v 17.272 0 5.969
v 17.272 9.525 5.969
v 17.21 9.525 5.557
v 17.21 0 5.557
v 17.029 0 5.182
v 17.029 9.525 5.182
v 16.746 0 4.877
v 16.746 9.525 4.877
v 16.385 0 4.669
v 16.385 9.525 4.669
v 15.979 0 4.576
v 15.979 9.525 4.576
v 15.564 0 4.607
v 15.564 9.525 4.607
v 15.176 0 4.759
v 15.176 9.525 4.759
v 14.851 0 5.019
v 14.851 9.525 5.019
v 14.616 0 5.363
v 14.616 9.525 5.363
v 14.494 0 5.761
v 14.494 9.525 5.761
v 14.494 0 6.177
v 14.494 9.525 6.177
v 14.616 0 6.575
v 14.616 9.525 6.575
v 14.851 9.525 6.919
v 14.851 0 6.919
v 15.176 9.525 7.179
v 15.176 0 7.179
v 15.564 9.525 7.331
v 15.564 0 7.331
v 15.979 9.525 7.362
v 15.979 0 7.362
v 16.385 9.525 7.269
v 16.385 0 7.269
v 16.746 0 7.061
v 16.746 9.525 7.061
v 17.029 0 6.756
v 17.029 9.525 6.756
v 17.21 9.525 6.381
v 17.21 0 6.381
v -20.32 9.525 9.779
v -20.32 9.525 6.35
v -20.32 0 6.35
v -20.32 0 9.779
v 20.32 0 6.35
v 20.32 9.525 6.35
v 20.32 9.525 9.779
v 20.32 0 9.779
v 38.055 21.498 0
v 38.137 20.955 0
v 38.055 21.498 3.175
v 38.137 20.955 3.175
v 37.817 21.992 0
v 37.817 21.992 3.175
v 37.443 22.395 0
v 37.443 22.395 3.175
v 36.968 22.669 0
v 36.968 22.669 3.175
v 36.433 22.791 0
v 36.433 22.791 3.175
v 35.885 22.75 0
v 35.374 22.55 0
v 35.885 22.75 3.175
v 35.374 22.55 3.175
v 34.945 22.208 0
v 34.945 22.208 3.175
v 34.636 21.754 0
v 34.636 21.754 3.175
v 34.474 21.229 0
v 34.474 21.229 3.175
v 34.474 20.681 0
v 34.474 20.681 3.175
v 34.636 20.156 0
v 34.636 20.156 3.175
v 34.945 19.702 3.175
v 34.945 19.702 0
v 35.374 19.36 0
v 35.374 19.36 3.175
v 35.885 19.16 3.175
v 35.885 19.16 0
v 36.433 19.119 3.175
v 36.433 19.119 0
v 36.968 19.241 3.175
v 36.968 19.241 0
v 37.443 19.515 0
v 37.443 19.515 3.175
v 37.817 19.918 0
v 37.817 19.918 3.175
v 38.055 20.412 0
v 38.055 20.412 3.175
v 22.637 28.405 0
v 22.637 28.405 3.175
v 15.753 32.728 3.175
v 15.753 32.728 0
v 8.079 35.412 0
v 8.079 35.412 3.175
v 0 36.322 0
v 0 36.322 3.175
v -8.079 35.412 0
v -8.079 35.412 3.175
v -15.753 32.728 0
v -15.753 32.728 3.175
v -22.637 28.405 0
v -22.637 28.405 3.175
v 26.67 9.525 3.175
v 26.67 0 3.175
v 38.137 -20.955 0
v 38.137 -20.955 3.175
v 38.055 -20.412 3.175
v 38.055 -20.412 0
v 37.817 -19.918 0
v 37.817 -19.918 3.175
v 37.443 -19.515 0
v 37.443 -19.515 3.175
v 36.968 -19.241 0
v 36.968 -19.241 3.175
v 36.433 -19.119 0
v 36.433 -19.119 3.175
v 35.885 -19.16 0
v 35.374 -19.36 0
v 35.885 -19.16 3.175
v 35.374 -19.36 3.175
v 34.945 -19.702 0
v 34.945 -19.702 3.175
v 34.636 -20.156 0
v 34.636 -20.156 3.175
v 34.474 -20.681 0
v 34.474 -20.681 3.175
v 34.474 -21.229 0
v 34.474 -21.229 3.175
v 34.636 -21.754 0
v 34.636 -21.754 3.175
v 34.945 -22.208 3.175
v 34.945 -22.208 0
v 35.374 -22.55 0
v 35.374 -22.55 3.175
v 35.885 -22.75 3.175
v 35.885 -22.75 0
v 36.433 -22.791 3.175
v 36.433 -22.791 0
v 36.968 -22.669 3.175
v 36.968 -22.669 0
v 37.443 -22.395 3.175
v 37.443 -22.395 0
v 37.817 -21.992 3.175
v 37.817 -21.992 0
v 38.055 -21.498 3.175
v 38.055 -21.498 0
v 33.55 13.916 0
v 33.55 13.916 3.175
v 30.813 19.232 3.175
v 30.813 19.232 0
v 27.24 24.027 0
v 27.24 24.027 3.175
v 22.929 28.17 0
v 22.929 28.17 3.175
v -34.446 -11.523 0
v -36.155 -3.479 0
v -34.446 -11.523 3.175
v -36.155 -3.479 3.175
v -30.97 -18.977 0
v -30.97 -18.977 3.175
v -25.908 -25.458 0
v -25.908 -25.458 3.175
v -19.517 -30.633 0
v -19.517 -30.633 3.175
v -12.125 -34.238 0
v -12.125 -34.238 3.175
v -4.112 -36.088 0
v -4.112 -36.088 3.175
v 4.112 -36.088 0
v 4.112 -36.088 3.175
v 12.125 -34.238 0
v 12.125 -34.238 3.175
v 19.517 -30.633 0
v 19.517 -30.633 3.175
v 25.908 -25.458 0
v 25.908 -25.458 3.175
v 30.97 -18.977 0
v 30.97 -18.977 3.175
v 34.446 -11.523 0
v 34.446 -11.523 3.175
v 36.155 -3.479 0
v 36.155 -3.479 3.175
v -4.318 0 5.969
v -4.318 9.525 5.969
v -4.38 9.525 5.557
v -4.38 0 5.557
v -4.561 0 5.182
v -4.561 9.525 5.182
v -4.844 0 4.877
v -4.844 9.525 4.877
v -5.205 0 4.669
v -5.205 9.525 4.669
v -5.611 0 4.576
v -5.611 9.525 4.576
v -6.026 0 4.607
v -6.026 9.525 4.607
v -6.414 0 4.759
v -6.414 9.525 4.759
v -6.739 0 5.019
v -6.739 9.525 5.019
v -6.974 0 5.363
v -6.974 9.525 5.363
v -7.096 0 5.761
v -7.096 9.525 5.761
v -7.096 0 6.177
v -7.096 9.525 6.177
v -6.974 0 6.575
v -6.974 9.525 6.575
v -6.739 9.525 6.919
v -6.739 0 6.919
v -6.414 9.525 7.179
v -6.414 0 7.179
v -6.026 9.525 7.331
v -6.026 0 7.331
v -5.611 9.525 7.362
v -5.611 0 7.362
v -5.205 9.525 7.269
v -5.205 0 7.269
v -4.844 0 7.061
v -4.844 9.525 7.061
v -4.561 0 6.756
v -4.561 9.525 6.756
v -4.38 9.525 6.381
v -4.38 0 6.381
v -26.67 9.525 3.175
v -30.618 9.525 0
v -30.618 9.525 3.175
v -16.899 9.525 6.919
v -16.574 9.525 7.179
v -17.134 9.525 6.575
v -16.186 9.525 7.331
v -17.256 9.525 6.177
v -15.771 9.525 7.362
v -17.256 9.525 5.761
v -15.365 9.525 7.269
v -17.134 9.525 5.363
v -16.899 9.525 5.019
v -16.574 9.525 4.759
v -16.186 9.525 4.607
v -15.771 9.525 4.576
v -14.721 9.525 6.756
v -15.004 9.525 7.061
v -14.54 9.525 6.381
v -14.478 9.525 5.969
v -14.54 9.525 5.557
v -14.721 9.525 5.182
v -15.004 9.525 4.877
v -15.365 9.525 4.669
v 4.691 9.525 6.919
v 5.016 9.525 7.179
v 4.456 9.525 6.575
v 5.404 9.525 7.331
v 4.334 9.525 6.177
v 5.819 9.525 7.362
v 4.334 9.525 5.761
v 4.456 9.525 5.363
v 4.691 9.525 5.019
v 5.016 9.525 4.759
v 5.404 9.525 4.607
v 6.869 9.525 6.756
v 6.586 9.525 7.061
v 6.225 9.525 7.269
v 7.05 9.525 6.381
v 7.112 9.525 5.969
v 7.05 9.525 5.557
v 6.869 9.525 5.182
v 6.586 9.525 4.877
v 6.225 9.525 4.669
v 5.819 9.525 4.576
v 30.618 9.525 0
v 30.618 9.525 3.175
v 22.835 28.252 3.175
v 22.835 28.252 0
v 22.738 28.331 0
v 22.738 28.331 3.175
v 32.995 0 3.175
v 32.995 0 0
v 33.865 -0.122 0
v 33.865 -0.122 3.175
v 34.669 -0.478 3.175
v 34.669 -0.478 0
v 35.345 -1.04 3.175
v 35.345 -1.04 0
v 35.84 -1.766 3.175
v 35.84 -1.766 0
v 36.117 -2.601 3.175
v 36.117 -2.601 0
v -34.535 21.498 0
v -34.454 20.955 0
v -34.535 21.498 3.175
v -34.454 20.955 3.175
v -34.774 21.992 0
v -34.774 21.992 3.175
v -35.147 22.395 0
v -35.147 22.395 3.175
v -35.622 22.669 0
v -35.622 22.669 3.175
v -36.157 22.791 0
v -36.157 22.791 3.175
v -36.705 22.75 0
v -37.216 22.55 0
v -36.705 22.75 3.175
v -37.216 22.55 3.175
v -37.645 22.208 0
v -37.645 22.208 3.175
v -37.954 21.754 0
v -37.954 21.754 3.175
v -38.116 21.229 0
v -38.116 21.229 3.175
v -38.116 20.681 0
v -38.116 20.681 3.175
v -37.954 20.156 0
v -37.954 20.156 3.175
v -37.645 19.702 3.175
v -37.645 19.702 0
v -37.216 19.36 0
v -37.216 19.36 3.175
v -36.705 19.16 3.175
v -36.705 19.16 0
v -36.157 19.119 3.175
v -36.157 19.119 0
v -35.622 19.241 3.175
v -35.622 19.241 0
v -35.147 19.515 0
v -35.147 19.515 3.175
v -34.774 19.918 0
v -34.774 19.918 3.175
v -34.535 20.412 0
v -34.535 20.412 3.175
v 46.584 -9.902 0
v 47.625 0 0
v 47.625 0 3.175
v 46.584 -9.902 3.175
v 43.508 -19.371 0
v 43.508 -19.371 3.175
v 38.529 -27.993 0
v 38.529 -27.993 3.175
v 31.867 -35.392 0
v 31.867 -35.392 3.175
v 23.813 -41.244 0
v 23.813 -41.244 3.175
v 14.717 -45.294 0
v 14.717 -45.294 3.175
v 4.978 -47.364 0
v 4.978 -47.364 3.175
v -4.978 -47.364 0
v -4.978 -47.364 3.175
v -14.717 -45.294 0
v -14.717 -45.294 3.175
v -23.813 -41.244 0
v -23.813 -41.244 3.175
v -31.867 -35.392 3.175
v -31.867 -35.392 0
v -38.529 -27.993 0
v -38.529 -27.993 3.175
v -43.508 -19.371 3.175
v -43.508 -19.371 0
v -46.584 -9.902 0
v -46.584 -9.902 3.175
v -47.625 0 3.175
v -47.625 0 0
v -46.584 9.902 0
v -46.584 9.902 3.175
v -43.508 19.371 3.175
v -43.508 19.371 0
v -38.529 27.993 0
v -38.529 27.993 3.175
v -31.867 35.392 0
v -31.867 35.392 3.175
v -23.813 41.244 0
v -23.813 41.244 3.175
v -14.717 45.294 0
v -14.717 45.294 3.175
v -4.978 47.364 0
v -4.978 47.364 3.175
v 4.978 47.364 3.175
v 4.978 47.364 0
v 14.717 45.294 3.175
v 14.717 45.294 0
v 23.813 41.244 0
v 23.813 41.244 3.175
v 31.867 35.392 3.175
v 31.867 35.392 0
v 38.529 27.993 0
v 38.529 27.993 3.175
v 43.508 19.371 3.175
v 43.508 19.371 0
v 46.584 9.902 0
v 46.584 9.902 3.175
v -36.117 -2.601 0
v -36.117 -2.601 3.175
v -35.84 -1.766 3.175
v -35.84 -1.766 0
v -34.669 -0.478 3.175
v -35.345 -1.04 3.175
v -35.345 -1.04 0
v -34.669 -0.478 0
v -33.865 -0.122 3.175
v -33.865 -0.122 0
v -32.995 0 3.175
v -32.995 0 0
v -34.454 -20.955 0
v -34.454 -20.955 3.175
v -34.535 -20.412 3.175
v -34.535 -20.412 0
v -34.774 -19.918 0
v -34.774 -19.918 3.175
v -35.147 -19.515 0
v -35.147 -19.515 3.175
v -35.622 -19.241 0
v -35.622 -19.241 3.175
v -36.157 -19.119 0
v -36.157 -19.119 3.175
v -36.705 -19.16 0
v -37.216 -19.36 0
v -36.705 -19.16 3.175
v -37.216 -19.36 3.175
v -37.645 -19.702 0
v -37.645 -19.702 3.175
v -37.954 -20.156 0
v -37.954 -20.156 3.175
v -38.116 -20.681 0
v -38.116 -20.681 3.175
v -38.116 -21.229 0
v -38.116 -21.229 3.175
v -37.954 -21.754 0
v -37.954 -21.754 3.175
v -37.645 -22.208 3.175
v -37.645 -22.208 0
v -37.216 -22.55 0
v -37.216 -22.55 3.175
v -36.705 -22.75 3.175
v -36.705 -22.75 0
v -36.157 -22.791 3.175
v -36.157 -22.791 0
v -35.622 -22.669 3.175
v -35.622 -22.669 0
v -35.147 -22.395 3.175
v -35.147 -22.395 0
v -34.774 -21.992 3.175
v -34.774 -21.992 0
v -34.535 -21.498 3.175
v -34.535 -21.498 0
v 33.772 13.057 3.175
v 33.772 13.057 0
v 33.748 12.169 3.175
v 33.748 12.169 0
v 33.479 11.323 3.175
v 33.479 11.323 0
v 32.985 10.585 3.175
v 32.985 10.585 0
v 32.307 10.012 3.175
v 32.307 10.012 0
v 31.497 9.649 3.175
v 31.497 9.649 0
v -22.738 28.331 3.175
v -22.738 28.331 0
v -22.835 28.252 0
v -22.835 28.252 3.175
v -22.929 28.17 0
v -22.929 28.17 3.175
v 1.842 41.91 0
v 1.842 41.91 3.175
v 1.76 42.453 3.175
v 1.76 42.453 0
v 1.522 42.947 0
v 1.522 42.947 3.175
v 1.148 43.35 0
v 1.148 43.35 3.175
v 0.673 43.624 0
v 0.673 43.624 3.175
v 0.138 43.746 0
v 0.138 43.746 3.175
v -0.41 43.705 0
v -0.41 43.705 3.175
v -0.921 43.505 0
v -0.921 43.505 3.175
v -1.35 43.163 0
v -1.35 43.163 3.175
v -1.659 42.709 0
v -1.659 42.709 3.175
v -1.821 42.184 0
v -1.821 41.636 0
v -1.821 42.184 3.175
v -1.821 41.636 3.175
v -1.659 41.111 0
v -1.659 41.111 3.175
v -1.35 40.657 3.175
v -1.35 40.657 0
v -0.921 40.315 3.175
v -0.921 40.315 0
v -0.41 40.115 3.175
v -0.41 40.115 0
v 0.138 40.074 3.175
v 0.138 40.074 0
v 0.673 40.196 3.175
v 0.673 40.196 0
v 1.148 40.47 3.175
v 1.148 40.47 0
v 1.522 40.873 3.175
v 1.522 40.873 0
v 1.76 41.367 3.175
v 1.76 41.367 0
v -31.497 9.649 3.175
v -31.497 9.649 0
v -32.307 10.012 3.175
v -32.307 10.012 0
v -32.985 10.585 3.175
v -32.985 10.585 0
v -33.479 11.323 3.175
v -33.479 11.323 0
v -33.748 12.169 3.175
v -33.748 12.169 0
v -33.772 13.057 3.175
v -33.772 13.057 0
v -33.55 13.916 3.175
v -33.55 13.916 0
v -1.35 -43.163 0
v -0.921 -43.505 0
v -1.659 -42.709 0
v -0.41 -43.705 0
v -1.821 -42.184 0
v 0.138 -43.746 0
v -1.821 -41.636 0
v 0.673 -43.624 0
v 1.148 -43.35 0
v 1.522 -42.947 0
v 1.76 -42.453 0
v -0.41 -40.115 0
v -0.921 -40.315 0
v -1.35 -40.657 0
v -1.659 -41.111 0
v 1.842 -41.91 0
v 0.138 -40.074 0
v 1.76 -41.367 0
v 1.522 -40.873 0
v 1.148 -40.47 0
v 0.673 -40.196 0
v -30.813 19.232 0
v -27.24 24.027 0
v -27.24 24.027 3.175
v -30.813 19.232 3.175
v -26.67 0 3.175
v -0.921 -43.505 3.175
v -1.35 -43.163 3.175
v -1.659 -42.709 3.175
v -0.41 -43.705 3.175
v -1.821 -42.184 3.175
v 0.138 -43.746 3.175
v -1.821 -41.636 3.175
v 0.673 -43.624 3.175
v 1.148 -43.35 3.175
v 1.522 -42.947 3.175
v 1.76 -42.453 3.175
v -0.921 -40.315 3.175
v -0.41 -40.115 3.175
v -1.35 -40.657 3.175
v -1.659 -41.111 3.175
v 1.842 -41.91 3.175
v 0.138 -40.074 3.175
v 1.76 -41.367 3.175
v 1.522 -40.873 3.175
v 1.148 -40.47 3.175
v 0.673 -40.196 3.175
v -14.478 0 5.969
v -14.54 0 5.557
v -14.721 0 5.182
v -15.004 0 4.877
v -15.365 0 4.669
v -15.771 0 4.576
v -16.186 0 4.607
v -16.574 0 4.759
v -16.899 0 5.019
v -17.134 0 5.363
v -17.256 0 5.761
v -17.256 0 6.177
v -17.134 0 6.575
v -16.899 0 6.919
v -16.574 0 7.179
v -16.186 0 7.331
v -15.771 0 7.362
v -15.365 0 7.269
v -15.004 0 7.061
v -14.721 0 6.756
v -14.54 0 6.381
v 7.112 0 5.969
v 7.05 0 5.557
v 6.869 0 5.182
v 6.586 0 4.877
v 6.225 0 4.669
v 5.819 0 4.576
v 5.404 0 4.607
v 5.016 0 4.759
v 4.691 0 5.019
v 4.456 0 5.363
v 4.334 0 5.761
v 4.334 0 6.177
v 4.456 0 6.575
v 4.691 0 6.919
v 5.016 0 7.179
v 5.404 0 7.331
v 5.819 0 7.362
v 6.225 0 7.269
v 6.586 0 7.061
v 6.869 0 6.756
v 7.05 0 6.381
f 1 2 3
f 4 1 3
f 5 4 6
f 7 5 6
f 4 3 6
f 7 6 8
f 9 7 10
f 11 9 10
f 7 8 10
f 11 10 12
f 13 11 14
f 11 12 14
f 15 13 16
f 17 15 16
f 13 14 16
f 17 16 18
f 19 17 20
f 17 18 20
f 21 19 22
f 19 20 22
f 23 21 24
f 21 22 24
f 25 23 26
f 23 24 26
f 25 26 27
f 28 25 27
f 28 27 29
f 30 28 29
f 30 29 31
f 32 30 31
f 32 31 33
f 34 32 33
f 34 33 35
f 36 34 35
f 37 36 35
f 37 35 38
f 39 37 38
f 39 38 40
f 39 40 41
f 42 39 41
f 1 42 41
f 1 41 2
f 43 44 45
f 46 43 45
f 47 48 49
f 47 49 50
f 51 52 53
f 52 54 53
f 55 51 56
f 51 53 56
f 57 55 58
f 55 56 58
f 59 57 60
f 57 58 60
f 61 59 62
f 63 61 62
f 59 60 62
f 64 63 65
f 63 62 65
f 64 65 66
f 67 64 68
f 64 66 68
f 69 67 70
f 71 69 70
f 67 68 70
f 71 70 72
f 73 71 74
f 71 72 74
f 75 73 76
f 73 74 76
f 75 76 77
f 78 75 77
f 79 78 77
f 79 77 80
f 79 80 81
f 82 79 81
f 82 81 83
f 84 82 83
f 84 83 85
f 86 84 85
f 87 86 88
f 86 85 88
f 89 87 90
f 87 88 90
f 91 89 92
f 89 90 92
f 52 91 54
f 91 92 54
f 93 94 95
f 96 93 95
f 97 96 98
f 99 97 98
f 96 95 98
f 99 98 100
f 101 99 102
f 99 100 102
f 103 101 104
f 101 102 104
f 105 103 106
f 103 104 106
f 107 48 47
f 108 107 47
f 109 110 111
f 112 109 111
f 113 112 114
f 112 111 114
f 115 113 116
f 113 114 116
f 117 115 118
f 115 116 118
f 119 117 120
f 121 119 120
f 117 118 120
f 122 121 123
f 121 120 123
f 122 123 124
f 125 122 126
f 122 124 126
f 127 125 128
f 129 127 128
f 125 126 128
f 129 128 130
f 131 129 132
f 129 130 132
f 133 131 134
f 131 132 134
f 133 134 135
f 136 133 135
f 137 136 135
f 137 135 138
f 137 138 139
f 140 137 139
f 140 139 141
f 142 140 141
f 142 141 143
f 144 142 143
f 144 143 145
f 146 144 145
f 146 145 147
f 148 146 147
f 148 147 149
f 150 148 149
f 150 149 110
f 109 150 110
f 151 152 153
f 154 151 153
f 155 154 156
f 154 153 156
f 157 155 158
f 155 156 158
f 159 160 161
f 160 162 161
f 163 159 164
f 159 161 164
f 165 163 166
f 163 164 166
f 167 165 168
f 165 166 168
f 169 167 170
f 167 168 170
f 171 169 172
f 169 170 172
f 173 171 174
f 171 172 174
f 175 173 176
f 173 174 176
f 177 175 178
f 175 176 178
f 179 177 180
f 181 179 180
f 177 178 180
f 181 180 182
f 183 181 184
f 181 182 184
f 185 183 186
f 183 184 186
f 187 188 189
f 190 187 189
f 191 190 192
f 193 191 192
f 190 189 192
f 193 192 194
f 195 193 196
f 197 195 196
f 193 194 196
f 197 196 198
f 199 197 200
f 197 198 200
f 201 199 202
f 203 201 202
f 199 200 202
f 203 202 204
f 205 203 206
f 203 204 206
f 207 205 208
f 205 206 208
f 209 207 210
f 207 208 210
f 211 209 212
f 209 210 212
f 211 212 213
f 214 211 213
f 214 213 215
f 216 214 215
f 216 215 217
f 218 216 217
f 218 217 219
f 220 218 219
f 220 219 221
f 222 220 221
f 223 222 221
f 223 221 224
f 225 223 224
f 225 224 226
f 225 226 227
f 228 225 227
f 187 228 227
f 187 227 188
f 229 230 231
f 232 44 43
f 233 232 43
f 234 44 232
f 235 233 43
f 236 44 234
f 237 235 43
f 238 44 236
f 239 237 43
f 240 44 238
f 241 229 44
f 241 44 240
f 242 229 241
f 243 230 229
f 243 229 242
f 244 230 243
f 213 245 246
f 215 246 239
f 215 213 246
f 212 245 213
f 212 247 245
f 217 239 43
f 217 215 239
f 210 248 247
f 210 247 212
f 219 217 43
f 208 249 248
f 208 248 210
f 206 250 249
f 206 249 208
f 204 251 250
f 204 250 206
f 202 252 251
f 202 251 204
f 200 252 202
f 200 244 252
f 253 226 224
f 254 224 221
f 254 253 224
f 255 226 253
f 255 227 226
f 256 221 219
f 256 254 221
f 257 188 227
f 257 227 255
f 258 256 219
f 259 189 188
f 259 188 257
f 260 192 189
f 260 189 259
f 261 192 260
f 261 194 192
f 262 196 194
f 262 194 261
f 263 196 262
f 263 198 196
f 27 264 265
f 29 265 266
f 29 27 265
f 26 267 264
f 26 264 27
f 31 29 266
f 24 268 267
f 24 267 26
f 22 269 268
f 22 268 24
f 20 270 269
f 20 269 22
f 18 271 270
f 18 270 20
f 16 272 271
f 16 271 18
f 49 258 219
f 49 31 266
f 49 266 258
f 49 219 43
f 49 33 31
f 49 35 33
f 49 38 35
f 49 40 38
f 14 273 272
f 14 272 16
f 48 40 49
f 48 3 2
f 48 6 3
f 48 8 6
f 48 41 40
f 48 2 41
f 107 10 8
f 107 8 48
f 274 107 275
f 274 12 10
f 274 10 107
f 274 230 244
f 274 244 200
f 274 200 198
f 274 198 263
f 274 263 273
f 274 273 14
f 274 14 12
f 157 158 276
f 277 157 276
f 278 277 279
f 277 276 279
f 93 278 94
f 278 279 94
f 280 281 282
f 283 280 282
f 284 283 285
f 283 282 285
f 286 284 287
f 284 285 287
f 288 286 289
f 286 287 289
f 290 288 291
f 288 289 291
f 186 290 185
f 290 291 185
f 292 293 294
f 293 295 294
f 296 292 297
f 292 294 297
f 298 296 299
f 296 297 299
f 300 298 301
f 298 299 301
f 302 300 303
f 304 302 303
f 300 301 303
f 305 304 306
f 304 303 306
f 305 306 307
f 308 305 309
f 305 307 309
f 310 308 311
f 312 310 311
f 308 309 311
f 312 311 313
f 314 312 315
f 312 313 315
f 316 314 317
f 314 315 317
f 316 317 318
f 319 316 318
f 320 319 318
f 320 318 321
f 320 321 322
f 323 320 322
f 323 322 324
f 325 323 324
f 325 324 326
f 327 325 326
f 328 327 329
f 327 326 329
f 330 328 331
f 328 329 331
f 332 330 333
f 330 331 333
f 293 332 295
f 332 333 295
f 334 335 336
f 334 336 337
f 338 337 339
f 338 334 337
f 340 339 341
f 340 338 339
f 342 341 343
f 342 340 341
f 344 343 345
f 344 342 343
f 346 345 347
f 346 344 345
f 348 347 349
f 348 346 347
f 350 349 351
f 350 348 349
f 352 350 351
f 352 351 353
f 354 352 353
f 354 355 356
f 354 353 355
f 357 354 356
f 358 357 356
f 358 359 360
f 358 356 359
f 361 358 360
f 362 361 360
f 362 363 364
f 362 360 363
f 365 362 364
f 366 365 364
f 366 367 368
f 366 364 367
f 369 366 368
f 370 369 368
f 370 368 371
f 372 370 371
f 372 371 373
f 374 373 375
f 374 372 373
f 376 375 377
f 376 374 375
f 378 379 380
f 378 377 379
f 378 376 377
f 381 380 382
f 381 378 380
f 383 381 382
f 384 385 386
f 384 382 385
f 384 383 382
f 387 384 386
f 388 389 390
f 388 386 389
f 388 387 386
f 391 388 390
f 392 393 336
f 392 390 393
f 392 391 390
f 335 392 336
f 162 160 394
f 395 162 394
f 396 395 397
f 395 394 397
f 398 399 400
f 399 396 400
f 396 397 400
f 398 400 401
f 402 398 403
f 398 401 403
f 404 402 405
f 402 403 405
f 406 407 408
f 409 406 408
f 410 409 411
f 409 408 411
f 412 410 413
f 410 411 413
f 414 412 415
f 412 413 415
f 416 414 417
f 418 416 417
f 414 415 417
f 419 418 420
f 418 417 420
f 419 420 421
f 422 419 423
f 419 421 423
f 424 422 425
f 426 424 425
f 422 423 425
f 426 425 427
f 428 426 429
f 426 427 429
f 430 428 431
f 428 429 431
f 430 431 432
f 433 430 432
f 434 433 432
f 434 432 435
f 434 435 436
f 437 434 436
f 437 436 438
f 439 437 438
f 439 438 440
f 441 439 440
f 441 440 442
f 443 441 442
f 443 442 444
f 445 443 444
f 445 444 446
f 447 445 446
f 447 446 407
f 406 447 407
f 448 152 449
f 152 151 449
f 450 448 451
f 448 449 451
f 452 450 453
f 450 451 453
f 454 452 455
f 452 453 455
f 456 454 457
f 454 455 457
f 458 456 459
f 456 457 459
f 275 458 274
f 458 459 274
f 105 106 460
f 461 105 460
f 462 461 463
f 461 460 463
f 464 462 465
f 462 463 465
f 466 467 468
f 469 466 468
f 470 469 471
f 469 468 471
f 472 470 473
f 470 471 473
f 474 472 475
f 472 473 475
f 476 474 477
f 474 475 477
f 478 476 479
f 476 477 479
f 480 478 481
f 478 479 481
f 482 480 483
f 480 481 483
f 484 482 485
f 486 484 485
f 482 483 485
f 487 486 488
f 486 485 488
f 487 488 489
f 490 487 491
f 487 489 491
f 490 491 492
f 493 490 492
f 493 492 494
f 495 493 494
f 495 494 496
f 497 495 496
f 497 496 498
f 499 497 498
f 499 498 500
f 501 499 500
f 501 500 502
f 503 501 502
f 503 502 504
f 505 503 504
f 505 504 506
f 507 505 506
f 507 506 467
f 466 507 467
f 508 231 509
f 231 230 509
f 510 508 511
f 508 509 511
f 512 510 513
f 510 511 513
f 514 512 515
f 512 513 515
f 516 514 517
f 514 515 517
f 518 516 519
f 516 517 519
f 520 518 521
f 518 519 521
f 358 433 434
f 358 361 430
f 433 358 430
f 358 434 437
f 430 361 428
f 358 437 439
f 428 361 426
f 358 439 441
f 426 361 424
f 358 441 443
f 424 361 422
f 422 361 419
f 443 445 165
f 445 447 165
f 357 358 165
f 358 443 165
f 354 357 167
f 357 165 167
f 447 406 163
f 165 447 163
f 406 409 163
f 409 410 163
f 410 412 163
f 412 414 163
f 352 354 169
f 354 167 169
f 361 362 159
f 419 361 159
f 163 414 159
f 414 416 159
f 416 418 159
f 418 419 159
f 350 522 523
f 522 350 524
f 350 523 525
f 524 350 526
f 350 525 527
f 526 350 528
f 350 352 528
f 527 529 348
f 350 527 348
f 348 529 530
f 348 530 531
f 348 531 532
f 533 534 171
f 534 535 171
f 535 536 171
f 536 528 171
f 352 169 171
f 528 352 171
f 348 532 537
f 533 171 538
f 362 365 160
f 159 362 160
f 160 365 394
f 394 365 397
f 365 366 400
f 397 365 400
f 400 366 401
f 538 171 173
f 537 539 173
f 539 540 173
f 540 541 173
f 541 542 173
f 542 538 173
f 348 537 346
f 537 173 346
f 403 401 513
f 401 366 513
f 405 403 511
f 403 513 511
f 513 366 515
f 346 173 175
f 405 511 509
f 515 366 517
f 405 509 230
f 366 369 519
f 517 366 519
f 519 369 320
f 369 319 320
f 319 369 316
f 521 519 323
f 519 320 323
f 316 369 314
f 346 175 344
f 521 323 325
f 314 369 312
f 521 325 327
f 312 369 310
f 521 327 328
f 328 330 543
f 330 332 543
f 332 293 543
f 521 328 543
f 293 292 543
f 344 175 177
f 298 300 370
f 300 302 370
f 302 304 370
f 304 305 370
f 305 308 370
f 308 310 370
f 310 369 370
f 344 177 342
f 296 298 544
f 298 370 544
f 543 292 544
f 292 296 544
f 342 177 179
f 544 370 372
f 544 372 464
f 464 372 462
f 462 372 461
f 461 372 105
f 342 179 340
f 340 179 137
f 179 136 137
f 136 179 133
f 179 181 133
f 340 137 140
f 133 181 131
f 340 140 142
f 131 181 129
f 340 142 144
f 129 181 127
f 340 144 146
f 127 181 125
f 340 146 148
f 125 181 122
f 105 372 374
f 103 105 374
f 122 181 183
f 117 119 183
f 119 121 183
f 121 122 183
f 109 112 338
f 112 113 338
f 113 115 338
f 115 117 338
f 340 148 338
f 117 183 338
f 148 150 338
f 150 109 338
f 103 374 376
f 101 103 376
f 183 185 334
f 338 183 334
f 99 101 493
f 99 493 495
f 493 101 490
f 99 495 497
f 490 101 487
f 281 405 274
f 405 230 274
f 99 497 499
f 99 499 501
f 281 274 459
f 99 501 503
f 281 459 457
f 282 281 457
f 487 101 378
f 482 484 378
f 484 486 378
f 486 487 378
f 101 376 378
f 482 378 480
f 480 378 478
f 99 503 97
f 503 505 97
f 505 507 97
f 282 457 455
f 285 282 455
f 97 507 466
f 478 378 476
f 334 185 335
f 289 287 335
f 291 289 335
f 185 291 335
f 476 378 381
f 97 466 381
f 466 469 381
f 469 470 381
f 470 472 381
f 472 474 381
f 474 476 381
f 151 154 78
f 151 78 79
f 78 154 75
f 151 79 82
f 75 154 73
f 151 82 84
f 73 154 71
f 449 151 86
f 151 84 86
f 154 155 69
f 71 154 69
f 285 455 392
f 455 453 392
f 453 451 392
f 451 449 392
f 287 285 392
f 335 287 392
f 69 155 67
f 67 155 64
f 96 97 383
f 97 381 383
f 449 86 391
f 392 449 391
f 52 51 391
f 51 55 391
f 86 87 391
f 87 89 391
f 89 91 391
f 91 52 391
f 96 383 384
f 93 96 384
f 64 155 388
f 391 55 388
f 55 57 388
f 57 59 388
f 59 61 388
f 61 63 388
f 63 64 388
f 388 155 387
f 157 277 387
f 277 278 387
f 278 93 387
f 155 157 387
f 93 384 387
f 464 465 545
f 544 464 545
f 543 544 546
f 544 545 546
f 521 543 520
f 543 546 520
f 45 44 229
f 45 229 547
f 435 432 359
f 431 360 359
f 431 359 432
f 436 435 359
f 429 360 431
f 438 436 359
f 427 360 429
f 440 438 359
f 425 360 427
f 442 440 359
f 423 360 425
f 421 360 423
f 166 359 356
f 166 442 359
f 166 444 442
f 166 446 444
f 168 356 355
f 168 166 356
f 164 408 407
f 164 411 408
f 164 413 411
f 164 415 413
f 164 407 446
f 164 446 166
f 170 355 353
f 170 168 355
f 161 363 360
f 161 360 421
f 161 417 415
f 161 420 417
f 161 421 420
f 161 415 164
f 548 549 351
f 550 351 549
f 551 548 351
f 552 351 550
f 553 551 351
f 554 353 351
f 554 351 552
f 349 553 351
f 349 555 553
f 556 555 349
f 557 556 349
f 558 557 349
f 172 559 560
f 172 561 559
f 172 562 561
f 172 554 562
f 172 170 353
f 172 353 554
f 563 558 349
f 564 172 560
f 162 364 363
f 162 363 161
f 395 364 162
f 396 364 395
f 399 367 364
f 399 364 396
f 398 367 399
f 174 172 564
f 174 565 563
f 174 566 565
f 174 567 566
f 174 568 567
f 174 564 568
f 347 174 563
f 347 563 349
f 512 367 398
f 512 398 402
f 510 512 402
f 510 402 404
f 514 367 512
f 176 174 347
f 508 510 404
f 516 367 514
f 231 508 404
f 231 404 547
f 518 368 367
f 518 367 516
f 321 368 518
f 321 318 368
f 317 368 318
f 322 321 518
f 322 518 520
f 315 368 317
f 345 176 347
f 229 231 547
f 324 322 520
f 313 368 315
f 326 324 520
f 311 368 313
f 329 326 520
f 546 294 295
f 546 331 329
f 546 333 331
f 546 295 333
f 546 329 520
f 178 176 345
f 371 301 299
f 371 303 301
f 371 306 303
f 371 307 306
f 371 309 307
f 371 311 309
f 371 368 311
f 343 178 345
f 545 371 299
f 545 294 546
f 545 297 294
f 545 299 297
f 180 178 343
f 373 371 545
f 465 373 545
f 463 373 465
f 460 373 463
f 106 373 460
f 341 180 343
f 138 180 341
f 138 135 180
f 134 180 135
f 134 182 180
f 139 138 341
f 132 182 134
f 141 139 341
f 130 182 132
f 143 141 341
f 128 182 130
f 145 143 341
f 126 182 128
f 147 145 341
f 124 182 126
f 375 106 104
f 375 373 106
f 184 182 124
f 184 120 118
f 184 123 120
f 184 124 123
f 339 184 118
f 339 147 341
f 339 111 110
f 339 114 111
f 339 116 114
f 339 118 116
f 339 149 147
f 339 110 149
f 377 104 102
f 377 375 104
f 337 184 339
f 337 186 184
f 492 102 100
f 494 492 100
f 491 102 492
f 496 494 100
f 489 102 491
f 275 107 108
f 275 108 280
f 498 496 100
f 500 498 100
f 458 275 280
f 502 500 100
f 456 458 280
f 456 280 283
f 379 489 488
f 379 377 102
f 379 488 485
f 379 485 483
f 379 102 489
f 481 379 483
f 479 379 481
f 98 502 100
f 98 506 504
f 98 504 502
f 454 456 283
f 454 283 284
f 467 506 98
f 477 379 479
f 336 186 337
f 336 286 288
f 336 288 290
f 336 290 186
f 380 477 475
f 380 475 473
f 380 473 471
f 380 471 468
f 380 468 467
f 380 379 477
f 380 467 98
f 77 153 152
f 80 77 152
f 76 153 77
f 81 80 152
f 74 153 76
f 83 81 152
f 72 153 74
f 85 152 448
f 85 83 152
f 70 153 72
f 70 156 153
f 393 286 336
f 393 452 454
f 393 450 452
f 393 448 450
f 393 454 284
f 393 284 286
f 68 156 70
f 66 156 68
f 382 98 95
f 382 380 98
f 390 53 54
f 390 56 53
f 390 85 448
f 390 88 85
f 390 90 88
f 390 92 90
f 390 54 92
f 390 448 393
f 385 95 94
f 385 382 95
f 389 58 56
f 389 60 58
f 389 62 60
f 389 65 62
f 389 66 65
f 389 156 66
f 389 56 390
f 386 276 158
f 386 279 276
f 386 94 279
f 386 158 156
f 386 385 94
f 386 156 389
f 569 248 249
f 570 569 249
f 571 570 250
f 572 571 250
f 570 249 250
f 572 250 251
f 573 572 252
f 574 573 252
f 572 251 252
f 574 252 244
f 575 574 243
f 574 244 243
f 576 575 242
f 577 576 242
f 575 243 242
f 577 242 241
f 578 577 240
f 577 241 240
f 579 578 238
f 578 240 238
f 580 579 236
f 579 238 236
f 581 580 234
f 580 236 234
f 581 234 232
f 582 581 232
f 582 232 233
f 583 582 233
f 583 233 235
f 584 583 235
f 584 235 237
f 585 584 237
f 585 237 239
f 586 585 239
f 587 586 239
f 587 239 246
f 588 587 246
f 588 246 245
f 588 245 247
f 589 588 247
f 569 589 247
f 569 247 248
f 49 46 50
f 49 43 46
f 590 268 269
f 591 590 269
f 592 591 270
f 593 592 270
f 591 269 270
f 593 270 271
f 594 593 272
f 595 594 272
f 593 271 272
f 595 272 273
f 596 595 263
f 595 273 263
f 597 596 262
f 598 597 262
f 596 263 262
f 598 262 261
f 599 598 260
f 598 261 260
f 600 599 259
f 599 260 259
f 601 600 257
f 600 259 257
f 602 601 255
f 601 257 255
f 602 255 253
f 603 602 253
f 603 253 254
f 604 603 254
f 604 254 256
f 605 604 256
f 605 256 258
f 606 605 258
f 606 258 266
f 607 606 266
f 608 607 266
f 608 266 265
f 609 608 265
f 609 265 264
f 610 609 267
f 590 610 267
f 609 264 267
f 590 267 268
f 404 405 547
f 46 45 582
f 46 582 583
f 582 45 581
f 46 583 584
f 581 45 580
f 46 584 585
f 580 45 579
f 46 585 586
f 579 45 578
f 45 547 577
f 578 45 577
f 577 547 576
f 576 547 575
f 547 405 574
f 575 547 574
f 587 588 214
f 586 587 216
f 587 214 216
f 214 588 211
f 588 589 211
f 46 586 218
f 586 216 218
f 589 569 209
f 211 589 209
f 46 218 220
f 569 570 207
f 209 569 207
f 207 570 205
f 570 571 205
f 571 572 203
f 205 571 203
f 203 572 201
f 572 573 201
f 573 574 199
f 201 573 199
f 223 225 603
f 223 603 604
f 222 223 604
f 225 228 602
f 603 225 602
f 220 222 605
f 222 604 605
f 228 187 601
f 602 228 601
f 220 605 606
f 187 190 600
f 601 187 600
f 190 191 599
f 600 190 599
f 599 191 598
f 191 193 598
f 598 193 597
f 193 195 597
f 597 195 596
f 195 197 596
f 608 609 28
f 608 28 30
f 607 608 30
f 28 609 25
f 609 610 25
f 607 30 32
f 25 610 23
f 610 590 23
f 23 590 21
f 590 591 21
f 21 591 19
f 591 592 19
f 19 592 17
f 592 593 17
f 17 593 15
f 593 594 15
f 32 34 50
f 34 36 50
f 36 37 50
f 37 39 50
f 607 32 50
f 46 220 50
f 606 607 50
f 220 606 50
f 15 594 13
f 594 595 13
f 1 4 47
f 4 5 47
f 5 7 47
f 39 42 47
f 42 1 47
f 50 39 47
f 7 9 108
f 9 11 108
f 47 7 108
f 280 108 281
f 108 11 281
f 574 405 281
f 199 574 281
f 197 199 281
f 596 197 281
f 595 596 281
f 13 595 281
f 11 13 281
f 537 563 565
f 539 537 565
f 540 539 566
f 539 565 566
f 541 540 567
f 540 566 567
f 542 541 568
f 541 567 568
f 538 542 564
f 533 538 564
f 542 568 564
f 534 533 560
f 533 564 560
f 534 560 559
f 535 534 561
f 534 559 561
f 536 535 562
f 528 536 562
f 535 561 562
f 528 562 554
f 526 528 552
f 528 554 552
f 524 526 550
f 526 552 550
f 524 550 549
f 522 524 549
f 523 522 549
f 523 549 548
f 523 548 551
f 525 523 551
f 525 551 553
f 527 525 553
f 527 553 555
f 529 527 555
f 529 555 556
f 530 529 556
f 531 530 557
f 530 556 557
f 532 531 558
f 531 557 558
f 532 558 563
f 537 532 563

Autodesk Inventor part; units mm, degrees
ref_plane "YZ Plane" through (0, 0, 0) normal (1, 0, 0) x (0, 1, 0)
ref_plane "XZ Plane" through (0, 0, 0) normal (0, 1, 0) x (-1, 0, 0)
ref_plane "XY Plane" through (0, 0, 0) normal (0, 0, 1) x (1, 0, 0)
sketch "Sketch1" plane through (0, 0, 0) normal (0, 0, 1) x (1, 0, 0)
  circle A0 centre (0, 0) radius 47.625
  dimension "d0" = 95.25
extrude "Extrusion1" add sketch "Sketch1" along normal blind 3.175
sketch "Sketch3" plane through (0, 0, 3.175) normal (0, 0, 1) x (1, 0, 0)
  line L0 (1.27, 9.525) -> (20.32, 9.525)
  line L1 (20.32, 9.525) -> (20.32, 0)
  line L2 (20.32, 0) -> (1.27, 0)
  line L3 (1.27, 0) -> (1.27, 9.525)
  line L4 (0, 0) -> (0, -11.0035)
  line L5 (-1.27, 9.525) -> (-20.32, 9.525)
  line L6 (-20.32, 9.525) -> (-20.32, 0)
  line L7 (-20.32, 0) -> (-1.27, 0)
  line L8 (-1.27, 0) -> (-1.27, 9.525)
  dimension "d11" = 19.05
  dimension "d12" = 9.525
  dimension "d13" = 1.27
  dimension "d14" = 0
extrude "Extrusion3" add sketch "Sketch3" along normal blind 6.604
sketch "Sketch4" plane through (1.27, 9.525, 3.175) normal (0, 1, 0) x (1, 0, 0)
  circle A0 centre (4.445, -2.794) radius 1.397
  line L0 (19.05, -6.604) -> (0, -6.604) projected
  circle A1 centre (14.605, -2.794) radius 1.397
  line L1 (9.525, -6.604) -> (9.525, -7.9119)
  line L2 (-1.27, 3.175) -> (-1.27, 8.3959)
  circle A2 centre (-6.985, -2.794) radius 1.397
  circle A3 centre (-17.145, -2.794) radius 1.397
  dimension "d17" = 2.794
  dimension "d18" = 3.81
  dimension "d19" = 2.794
  dimension "d20" = 3.81
  dimension "d21" = 10.16
  dimension "d22" = 5.08
extrude "Extrusion4" cut sketch "Sketch4" against normal through all
sketch "Sketch5" plane through (0, 0, 3.175) normal (0, 0, 1) x (1, 0, 0)
  circle A0 centre (20.795, 25.8191) radius 3.175
  line L0 (0, 0) -> (0, 16.9345)
  circle A1 centre (-20.795, 25.8191) radius 3.175
  dimension "d25" = 6.35
  dimension "d26" = 20.795
  dimension "d27" = 25.8191
extrude "Extrusion5" cut sketch "Sketch5" against normal blind 25.4
sketch "Sketch6" plane through (0, 0, 3.175) normal (0, 0, 1) x (1, 0, 0)
  line L0 (0, 0) -> (0, 41.91)
  circle A0 centre (0, 41.91) radius 1.8415
  circle A1 centre (-36.2951, 20.955) radius 1.8415
  circle A2 centre (-36.2951, -20.955) radius 1.8415
  circle A3 centre (0, -41.91) radius 1.8415
  circle A4 centre (36.2951, -20.955) radius 1.8415
  circle A5 centre (36.2951, 20.955) radius 1.8415
  dimension "d30" = 41.91
  dimension "d31" = 3.683
  dimension "d34" = 360
extrude "Extrusion6" cut sketch "Sketch6" against normal blind 25.4
sketch "Sketch9" plane through (0, 0, 3.175) normal (0, 0, 1) x (1, 0, 0)
  circle A0 centre (0, 0) radius 36.322
  line L0 (-1.27, 9.525) -> (-20.32, 9.525) projected
  line L1 (-20.32, 9.525) -> (-20.32, 0) projected
  line L2 (-20.32, 0) -> (-1.27, 0) projected
  line L3 (-1.27, 0) -> (-1.27, 9.525) projected
  line L4 (20.32, 9.525) -> (1.27, 9.525) projected
  line L5 (1.27, 9.525) -> (1.27, 0) projected
  line L6 (1.27, 0) -> (20.32, 0) projected
  line L7 (20.32, 0) -> (20.32, 9.525) projected
  line L8 (-20.32, 0) -> (-20.32, 9.525) projected
  line L9 (-20.32, 9.525) -> (-35.0508, 9.525)
  line L10 (-20.32, 0) -> (-36.322, 0)
  line L11 (-1.27, 9.525) -> (-1.27, 0) projected
  line L12 (1.27, 9.525) -> (1.27, 0) projected
  line L13 (-1.27, 9.525) -> (1.27, 9.525)
  line L14 (-1.27, 0) -> (1.27, 0)
  line L15 (20.32, 0) -> (36.322, 0)
  line L16 (20.32, 9.525) -> (35.0508, 9.525)
  point P0 (-28.956, -21.928)
  point P1 (-20.701, -29.8455)
  point P2 (28.956, -21.928)
extrude "Extrusion9" cut sketch "Sketch9" against normal through all contours A0 L10 L2 L14 L6 L15 | L16 L4 L13 L0 L9 A0
sketch "Sketch10" plane through (-1.27, 9.525, 3.175) normal (0, 1, 0) x (1, 0, 0)
  line L0 (0, 0) -> (0, -6.604) projected
  line L1 (2.54, 0) -> (2.54, -6.604) projected
  line L2 (0, -6.604) -> (2.54, -6.604)
  line L3 (2.54, -6.604) -> (2.54, 0)
  line L4 (2.54, 0) -> (0, 0)
  line L5 (0, 0) -> (0, -6.604)
  point P0 (1.27, 3.175)
extrude "Extrusion10" add sketch "Sketch10" against normal up to surface (9.525 mm away)
chamfer "Chamfer1" distance 6.35 distance2 3.175 1 edges at (20.32, 4.7625, 3.175) measured on face at (-30.5643, 3.175, 3.175)
chamfer "Chamfer2" distance 6.35 distance2 3.175 1 edges at (-20.32, 4.7625, 3.175) measured on face at (-30.5643, 3.175, 3.175)
fillet "Fillet3" radius 3.175 4 edges at (-35.0508, 9.525, 1.5875) (-36.322, 0, 1.5875) (35.0508, 9.525, 1.5875) (36.322, 0, 1.5875)
properties part number "rearServoAttachmentPlate" material "ABS Plastic"
